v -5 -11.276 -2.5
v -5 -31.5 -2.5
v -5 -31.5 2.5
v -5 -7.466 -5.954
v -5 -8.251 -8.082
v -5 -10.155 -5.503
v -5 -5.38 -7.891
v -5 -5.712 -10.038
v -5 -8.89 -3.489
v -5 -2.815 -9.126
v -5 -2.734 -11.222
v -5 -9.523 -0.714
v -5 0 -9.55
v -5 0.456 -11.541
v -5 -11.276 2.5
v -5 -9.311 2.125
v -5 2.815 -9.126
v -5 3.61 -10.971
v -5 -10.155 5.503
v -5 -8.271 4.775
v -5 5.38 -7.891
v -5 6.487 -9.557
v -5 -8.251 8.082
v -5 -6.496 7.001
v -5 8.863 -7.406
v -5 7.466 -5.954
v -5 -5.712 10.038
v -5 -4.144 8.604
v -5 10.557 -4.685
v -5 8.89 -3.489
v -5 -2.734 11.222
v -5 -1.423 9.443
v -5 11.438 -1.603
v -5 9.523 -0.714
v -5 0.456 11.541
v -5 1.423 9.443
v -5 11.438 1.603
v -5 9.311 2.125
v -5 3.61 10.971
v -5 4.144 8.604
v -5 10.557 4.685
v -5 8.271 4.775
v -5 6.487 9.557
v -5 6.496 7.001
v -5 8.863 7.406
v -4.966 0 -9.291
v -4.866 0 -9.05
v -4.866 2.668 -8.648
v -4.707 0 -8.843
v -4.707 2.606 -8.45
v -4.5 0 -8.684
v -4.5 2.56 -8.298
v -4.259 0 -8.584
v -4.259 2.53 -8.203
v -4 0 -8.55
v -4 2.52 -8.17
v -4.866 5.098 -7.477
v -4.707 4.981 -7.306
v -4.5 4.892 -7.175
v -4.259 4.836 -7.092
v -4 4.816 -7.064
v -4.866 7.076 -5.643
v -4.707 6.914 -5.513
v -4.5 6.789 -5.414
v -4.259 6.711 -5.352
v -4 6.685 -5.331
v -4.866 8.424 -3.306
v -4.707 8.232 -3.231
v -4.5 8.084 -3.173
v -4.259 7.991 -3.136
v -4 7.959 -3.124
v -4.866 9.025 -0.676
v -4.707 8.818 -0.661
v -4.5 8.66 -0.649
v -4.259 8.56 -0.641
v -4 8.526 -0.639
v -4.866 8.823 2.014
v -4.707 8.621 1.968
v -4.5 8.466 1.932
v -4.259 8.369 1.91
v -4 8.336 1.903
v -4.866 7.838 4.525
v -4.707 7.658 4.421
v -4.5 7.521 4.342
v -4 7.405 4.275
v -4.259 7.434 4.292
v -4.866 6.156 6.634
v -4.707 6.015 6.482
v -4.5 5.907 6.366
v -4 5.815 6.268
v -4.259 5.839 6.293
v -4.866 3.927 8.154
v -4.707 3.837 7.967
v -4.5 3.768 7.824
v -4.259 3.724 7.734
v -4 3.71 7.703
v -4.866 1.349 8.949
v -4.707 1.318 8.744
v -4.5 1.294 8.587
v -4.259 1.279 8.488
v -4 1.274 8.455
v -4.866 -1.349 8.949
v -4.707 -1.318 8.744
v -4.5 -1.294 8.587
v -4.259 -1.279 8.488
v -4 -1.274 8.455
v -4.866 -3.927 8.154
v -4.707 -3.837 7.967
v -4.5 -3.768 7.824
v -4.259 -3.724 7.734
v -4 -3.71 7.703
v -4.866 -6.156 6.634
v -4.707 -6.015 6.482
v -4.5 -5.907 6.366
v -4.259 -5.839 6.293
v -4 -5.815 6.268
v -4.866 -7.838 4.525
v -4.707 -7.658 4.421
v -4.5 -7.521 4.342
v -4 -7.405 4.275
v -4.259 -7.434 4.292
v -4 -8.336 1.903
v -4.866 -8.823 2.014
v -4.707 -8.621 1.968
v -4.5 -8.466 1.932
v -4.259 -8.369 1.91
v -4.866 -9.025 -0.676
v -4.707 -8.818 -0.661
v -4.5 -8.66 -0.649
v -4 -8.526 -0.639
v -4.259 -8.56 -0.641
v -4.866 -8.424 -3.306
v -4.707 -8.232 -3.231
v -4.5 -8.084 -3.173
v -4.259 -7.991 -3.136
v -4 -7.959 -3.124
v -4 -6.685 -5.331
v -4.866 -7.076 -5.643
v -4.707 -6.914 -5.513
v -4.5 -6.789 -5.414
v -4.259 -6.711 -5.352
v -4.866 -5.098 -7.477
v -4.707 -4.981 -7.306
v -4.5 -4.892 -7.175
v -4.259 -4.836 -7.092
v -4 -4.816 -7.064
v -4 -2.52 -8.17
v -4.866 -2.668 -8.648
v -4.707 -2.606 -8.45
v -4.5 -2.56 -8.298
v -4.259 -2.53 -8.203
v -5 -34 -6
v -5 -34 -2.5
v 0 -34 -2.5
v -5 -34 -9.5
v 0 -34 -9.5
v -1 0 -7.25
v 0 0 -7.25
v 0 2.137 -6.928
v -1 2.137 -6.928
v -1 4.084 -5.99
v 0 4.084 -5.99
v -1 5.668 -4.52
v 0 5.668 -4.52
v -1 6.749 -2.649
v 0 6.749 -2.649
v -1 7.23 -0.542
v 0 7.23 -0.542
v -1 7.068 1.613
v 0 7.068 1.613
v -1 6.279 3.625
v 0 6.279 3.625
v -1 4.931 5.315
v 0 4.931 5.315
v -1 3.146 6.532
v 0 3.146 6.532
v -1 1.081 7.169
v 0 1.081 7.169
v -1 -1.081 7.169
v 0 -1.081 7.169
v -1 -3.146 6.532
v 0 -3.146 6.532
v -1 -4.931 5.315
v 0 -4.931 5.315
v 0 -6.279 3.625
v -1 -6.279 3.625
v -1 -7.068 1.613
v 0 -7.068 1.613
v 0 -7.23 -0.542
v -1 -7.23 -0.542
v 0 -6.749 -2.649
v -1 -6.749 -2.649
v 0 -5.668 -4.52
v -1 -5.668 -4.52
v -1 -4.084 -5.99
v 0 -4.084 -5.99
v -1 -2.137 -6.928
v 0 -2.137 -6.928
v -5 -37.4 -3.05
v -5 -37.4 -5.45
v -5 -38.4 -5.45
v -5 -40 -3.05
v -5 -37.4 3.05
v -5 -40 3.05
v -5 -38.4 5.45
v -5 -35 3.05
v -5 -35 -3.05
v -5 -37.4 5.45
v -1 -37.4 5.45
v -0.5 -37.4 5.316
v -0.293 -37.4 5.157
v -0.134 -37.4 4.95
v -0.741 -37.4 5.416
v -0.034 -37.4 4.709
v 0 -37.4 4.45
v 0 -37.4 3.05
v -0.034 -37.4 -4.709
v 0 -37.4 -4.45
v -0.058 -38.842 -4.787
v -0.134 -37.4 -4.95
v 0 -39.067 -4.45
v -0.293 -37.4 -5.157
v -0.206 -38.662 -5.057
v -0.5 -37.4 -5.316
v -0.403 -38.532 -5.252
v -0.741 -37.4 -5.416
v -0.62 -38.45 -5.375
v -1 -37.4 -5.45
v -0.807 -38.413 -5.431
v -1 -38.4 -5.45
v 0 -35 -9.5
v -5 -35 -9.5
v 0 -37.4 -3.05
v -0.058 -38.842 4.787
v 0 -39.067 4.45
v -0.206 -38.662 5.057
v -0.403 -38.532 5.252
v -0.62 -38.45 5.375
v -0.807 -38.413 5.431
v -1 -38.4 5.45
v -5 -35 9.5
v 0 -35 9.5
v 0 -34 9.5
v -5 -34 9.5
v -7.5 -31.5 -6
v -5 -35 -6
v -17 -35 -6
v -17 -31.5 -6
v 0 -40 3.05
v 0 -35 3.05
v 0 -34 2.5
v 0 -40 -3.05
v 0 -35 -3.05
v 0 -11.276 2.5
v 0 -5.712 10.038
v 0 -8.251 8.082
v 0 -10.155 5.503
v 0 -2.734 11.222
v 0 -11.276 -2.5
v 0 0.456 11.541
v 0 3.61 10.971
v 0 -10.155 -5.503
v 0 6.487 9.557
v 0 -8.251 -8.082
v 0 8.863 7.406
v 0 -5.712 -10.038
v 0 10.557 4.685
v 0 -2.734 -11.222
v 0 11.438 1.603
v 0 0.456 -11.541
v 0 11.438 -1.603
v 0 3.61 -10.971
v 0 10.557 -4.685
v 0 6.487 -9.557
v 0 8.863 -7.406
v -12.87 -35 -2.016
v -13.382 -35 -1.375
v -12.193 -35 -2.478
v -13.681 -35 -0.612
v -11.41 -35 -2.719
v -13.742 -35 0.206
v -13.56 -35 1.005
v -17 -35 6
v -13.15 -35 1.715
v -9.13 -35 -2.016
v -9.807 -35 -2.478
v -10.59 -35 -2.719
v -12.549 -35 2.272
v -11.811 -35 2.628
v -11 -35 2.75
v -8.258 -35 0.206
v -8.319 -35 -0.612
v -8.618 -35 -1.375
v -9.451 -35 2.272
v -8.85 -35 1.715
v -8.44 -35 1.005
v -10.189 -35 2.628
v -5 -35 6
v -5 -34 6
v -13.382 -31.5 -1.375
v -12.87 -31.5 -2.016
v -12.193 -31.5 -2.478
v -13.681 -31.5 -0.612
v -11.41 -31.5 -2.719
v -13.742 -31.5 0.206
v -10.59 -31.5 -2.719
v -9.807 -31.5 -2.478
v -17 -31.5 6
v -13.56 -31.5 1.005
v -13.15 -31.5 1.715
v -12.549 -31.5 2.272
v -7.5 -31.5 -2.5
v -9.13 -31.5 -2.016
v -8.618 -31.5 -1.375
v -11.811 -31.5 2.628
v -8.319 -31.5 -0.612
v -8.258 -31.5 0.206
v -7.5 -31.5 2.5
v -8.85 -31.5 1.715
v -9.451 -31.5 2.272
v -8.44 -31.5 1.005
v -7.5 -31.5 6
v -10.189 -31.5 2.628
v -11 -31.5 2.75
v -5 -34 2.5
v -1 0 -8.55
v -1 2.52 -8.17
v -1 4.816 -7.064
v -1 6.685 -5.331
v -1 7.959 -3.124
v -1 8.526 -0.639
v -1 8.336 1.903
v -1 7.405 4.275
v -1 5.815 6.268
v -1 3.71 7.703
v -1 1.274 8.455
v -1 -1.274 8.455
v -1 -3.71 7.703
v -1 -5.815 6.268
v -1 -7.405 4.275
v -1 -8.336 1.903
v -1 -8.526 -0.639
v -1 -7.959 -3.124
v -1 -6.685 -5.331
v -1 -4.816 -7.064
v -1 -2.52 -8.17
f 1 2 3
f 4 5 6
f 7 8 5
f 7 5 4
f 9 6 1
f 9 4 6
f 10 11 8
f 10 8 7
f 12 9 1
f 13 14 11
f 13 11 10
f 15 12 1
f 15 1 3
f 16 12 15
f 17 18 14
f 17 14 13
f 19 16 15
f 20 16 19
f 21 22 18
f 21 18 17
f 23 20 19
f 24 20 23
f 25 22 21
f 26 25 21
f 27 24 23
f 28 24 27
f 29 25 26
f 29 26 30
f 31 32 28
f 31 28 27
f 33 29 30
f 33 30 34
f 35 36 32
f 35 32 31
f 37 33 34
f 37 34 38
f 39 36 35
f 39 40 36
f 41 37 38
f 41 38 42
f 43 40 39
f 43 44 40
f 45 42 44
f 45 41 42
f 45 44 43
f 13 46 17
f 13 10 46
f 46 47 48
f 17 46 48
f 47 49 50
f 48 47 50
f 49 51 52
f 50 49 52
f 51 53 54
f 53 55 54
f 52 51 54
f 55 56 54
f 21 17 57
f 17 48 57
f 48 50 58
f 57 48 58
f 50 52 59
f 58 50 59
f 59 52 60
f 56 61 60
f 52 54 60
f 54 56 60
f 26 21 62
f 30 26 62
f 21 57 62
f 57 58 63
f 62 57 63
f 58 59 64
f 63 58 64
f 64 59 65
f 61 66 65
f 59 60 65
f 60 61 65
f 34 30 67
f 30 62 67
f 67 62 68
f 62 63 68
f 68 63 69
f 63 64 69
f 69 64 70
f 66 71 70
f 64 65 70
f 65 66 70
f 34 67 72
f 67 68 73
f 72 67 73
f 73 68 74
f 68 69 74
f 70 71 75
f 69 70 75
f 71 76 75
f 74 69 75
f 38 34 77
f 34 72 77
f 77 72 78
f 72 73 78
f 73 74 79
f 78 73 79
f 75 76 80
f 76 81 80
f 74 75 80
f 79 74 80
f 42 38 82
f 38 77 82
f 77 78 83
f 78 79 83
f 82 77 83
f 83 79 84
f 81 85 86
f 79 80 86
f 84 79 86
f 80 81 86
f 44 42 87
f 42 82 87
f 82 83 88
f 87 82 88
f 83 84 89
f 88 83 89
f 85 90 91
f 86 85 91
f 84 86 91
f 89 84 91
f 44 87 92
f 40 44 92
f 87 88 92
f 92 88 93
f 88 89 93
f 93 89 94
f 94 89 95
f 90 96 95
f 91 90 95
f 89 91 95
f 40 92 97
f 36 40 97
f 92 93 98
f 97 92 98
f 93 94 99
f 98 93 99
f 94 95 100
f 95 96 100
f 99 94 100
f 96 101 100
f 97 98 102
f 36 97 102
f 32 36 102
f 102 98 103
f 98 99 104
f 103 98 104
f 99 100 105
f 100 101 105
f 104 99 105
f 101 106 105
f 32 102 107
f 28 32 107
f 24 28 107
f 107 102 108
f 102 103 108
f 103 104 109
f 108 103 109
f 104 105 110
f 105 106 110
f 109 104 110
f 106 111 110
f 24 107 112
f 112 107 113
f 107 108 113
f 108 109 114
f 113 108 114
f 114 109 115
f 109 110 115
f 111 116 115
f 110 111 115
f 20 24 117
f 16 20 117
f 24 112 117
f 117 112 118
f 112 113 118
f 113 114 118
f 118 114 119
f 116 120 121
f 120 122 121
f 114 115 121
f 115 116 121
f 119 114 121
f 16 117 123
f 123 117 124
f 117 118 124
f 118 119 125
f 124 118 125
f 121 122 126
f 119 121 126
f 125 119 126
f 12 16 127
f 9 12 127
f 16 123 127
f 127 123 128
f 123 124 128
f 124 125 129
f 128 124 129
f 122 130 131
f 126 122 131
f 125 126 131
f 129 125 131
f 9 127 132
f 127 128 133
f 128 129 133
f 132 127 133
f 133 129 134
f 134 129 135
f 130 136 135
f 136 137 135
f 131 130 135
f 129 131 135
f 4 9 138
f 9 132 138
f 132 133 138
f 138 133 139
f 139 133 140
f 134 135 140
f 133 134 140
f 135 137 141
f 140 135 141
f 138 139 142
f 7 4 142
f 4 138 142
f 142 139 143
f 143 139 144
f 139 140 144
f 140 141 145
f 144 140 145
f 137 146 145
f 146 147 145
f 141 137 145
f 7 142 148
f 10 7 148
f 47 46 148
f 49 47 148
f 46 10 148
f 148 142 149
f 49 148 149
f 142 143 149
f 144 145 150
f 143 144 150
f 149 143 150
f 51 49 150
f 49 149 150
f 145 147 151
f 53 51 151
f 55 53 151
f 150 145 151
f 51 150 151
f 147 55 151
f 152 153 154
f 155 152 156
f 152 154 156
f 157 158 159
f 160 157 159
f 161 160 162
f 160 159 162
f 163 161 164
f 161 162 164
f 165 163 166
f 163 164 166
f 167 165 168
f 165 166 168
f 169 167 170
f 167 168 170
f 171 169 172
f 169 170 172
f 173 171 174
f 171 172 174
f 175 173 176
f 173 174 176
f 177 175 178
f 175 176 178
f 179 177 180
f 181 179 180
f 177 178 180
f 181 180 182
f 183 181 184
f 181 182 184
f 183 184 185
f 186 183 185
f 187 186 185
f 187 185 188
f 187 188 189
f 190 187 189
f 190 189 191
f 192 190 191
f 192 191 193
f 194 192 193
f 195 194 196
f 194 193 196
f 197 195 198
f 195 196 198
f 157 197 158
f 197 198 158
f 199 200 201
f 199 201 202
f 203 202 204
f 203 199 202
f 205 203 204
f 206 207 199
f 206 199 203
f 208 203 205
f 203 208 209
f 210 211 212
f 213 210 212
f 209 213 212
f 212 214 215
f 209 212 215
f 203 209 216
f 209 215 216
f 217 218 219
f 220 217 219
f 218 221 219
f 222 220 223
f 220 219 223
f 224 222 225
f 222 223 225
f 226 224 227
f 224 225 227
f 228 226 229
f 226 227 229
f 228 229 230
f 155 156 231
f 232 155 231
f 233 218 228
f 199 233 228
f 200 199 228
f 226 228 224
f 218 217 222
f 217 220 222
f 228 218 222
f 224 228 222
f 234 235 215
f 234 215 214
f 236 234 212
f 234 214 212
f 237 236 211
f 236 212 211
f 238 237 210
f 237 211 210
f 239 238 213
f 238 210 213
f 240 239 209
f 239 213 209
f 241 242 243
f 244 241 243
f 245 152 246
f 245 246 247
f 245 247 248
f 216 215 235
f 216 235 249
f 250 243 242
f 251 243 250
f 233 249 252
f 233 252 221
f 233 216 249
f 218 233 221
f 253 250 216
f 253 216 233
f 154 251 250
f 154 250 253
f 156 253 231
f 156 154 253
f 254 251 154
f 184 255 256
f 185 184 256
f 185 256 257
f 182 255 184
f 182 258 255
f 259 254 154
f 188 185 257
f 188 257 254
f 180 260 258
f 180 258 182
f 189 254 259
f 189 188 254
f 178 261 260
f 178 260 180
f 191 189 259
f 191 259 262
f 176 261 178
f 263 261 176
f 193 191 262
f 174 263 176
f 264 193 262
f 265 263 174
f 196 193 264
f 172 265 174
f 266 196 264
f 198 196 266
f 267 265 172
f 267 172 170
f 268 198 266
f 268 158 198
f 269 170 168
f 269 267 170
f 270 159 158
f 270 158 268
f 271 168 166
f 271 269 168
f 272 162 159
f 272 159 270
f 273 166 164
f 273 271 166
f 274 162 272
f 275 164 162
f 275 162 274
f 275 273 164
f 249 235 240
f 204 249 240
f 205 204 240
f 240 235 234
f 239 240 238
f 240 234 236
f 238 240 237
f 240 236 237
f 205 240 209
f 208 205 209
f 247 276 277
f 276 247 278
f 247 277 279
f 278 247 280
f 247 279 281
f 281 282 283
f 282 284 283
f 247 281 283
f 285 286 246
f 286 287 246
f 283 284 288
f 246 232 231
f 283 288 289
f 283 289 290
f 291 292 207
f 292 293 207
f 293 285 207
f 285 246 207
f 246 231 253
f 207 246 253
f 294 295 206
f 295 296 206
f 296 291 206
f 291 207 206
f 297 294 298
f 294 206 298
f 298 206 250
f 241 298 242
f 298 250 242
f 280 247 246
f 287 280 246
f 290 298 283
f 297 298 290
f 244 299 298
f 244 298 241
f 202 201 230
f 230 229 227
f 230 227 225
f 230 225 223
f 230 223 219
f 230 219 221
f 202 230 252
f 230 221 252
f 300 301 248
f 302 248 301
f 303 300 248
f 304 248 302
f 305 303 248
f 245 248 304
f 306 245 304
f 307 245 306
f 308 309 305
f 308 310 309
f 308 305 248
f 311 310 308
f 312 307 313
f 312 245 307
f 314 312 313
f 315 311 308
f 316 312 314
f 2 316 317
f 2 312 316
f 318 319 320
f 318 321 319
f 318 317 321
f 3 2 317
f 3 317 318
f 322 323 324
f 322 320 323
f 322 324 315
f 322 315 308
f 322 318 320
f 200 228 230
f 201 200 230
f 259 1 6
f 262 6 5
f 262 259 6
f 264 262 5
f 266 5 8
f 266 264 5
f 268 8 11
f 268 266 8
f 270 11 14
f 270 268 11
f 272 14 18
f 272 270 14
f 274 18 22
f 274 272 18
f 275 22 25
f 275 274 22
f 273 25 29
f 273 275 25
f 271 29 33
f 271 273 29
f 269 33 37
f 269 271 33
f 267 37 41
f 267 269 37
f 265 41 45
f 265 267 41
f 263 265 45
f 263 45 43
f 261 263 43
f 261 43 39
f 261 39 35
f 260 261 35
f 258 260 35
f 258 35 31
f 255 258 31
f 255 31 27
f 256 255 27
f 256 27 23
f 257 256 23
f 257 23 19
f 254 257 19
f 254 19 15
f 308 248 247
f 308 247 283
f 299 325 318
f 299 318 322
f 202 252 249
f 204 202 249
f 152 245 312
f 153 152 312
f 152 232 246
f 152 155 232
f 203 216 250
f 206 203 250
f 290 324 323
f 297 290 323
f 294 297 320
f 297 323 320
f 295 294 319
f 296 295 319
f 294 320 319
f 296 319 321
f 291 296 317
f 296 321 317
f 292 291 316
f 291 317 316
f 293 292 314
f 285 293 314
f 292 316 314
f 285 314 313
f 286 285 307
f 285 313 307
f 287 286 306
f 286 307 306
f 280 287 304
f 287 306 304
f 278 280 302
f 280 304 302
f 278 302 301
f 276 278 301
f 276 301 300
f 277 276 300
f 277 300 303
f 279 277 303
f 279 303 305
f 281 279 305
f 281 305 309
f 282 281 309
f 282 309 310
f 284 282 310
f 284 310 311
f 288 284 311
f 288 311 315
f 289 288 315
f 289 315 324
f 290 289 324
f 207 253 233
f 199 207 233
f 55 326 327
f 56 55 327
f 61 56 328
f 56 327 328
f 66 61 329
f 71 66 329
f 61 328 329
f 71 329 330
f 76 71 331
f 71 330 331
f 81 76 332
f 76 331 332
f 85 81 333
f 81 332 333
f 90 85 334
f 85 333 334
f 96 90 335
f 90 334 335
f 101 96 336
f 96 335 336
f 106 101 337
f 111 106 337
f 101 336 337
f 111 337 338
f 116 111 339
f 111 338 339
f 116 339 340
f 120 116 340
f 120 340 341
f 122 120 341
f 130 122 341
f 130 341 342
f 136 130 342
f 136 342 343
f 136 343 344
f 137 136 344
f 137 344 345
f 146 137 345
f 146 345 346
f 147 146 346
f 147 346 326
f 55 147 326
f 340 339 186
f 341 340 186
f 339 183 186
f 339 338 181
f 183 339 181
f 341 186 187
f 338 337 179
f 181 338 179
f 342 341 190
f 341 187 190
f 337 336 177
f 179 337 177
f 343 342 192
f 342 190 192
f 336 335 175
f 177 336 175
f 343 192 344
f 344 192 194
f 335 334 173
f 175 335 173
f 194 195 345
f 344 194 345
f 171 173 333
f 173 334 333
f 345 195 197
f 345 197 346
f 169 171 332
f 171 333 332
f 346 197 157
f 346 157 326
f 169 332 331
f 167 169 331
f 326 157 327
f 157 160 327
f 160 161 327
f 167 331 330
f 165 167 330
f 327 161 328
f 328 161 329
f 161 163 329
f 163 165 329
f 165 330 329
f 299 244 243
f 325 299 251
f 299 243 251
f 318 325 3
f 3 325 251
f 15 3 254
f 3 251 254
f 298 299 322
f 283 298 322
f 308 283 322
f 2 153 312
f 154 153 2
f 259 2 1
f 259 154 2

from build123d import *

# Parameters (mm, degrees)
SKETCH1_R            = 11.55
SKETCH1_R_2          = 8.55
BOSS_EXTRUDE1_DEPTH  = 5
SKETCH2_W            = 5
SKETCH2_H            = 23.723808267
BOSS_EXTRUDE2_DEPTH  = 5
BOSS_EXTRUDE3_DEPTH  = 5
FILLET1_R            = 1
SKETCH38_W           = 12
SKETCH38_H           = 3.5
BOSS_EXTRUDE28_DEPTH = 12
CUT_EXTRUDE3_REACH   = 49.704
SKETCH39_R           = 2.75
CHAMFER1_SIZE        = 2.5
FILLET3_R            = 1
SKETCH1_3_R          = 8.55
SKETCH1_3_R_2        = 7.25
BOSS_EXTRUDE29_DEPTH = 1


with BuildPart() as part:
    # Sketch1 → Boss-Extrude1 (new body)
    with BuildSketch(Plane(origin=(0, 0, 0), x_dir=(0, 0, -1), z_dir=(1, 0, 0))):
        Circle(SKETCH1_R)
        Circle(SKETCH1_R_2, mode=Mode.SUBTRACT)
    extrude(amount=-BOSS_EXTRUDE1_DEPTH)

    # Sketch2 → Boss-Extrude2 (add)
    with BuildSketch(Plane(origin=(0, 0, 0), x_dir=(0, 0, -1), z_dir=(1, 0, 0))):
        with Locations((0, -23.138095867)):
            Rectangle(SKETCH2_W, SKETCH2_H)
    extrude(amount=-BOSS_EXTRUDE2_DEPTH)

    # Sketch3 → Boss-Extrude3 (add)
    with BuildSketch(Plane(origin=(0, 0, 0), x_dir=(0, 0, -1), z_dir=(1, 0, 0))):
        Polygon((-9.5, -35), (-9.5, -34), (9.5, -34), (9.5, -35), (3.05, -35), (3.05, -37.4), (5.45, -37.4), (5.45, -38.4), (3.05, -40), (-3.05, -40), (-5.45, -38.4), (-5.45, -37.4), (-3.05, -37.4), (-3.05, -35), align=None)
    extrude(amount=-BOSS_EXTRUDE3_DEPTH)

    # Fillet1
    fillet1_edges = [part.edges().sort_by_distance(p)[0] for p in [
        (0, -37.9, 5.45),
        (0, -37.9, -5.45),
    ]]
    fillet(fillet1_edges, radius=FILLET1_R)

    # Sketch38 → Boss-Extrude28 (add)
    with BuildSketch(Plane.ZY.offset(5)):
        with Locations((0, -33.25)):
            Rectangle(SKETCH38_W, SKETCH38_H)
    extrude(amount=BOSS_EXTRUDE28_DEPTH)

    # Sketch39 → Cut-Extrude3 (cut, up to next)
    with BuildSketch(Plane(origin=(0, -31.5, 0), x_dir=(1, 0, 0), z_dir=(0, 1, 0)), mode=Mode.PRIVATE) as cut_extrude3_sk1:
        with Locations(Location((-11, 0, 0), (0, 0, 270))):
            Circle(SKETCH39_R)
    cut_extrude3_tool1 = extrude(cut_extrude3_sk1.sketch, amount=-CUT_EXTRUDE3_REACH, mode=Mode.PRIVATE) & part.part
    add(cut_extrude3_tool1.solids().sort_by_distance((-11, -31.5, 0))[0], mode=Mode.SUBTRACT)

    # Chamfer1
    chamfer1_edges = [part.edges().sort_by_distance(p)[0] for p in [
        (-5, -31.5, 4.25),
        (-5, -31.5, -4.25),
    ]]
    chamfer(chamfer1_edges, length=CHAMFER1_SIZE - 0.0001)  # a hair under: the kernel refuses the full size

    # Fillet3
    fillet3_edges = [part.edges().sort_by_distance(p)[0] for p in [
        (-5, 0, 8.55),
    ]]
    fillet(fillet3_edges, radius=FILLET3_R)

    # Sketch1<3> → Boss-Extrude29 (add)
    with BuildSketch(Plane(origin=(0, 0, 0), x_dir=(0, 0, -1), z_dir=(1, 0, 0))):
        Circle(SKETCH1_3_R)
        Circle(SKETCH1_3_R_2, mode=Mode.SUBTRACT)
    extrude(amount=-BOSS_EXTRUDE29_DEPTH)


solid = part.part
